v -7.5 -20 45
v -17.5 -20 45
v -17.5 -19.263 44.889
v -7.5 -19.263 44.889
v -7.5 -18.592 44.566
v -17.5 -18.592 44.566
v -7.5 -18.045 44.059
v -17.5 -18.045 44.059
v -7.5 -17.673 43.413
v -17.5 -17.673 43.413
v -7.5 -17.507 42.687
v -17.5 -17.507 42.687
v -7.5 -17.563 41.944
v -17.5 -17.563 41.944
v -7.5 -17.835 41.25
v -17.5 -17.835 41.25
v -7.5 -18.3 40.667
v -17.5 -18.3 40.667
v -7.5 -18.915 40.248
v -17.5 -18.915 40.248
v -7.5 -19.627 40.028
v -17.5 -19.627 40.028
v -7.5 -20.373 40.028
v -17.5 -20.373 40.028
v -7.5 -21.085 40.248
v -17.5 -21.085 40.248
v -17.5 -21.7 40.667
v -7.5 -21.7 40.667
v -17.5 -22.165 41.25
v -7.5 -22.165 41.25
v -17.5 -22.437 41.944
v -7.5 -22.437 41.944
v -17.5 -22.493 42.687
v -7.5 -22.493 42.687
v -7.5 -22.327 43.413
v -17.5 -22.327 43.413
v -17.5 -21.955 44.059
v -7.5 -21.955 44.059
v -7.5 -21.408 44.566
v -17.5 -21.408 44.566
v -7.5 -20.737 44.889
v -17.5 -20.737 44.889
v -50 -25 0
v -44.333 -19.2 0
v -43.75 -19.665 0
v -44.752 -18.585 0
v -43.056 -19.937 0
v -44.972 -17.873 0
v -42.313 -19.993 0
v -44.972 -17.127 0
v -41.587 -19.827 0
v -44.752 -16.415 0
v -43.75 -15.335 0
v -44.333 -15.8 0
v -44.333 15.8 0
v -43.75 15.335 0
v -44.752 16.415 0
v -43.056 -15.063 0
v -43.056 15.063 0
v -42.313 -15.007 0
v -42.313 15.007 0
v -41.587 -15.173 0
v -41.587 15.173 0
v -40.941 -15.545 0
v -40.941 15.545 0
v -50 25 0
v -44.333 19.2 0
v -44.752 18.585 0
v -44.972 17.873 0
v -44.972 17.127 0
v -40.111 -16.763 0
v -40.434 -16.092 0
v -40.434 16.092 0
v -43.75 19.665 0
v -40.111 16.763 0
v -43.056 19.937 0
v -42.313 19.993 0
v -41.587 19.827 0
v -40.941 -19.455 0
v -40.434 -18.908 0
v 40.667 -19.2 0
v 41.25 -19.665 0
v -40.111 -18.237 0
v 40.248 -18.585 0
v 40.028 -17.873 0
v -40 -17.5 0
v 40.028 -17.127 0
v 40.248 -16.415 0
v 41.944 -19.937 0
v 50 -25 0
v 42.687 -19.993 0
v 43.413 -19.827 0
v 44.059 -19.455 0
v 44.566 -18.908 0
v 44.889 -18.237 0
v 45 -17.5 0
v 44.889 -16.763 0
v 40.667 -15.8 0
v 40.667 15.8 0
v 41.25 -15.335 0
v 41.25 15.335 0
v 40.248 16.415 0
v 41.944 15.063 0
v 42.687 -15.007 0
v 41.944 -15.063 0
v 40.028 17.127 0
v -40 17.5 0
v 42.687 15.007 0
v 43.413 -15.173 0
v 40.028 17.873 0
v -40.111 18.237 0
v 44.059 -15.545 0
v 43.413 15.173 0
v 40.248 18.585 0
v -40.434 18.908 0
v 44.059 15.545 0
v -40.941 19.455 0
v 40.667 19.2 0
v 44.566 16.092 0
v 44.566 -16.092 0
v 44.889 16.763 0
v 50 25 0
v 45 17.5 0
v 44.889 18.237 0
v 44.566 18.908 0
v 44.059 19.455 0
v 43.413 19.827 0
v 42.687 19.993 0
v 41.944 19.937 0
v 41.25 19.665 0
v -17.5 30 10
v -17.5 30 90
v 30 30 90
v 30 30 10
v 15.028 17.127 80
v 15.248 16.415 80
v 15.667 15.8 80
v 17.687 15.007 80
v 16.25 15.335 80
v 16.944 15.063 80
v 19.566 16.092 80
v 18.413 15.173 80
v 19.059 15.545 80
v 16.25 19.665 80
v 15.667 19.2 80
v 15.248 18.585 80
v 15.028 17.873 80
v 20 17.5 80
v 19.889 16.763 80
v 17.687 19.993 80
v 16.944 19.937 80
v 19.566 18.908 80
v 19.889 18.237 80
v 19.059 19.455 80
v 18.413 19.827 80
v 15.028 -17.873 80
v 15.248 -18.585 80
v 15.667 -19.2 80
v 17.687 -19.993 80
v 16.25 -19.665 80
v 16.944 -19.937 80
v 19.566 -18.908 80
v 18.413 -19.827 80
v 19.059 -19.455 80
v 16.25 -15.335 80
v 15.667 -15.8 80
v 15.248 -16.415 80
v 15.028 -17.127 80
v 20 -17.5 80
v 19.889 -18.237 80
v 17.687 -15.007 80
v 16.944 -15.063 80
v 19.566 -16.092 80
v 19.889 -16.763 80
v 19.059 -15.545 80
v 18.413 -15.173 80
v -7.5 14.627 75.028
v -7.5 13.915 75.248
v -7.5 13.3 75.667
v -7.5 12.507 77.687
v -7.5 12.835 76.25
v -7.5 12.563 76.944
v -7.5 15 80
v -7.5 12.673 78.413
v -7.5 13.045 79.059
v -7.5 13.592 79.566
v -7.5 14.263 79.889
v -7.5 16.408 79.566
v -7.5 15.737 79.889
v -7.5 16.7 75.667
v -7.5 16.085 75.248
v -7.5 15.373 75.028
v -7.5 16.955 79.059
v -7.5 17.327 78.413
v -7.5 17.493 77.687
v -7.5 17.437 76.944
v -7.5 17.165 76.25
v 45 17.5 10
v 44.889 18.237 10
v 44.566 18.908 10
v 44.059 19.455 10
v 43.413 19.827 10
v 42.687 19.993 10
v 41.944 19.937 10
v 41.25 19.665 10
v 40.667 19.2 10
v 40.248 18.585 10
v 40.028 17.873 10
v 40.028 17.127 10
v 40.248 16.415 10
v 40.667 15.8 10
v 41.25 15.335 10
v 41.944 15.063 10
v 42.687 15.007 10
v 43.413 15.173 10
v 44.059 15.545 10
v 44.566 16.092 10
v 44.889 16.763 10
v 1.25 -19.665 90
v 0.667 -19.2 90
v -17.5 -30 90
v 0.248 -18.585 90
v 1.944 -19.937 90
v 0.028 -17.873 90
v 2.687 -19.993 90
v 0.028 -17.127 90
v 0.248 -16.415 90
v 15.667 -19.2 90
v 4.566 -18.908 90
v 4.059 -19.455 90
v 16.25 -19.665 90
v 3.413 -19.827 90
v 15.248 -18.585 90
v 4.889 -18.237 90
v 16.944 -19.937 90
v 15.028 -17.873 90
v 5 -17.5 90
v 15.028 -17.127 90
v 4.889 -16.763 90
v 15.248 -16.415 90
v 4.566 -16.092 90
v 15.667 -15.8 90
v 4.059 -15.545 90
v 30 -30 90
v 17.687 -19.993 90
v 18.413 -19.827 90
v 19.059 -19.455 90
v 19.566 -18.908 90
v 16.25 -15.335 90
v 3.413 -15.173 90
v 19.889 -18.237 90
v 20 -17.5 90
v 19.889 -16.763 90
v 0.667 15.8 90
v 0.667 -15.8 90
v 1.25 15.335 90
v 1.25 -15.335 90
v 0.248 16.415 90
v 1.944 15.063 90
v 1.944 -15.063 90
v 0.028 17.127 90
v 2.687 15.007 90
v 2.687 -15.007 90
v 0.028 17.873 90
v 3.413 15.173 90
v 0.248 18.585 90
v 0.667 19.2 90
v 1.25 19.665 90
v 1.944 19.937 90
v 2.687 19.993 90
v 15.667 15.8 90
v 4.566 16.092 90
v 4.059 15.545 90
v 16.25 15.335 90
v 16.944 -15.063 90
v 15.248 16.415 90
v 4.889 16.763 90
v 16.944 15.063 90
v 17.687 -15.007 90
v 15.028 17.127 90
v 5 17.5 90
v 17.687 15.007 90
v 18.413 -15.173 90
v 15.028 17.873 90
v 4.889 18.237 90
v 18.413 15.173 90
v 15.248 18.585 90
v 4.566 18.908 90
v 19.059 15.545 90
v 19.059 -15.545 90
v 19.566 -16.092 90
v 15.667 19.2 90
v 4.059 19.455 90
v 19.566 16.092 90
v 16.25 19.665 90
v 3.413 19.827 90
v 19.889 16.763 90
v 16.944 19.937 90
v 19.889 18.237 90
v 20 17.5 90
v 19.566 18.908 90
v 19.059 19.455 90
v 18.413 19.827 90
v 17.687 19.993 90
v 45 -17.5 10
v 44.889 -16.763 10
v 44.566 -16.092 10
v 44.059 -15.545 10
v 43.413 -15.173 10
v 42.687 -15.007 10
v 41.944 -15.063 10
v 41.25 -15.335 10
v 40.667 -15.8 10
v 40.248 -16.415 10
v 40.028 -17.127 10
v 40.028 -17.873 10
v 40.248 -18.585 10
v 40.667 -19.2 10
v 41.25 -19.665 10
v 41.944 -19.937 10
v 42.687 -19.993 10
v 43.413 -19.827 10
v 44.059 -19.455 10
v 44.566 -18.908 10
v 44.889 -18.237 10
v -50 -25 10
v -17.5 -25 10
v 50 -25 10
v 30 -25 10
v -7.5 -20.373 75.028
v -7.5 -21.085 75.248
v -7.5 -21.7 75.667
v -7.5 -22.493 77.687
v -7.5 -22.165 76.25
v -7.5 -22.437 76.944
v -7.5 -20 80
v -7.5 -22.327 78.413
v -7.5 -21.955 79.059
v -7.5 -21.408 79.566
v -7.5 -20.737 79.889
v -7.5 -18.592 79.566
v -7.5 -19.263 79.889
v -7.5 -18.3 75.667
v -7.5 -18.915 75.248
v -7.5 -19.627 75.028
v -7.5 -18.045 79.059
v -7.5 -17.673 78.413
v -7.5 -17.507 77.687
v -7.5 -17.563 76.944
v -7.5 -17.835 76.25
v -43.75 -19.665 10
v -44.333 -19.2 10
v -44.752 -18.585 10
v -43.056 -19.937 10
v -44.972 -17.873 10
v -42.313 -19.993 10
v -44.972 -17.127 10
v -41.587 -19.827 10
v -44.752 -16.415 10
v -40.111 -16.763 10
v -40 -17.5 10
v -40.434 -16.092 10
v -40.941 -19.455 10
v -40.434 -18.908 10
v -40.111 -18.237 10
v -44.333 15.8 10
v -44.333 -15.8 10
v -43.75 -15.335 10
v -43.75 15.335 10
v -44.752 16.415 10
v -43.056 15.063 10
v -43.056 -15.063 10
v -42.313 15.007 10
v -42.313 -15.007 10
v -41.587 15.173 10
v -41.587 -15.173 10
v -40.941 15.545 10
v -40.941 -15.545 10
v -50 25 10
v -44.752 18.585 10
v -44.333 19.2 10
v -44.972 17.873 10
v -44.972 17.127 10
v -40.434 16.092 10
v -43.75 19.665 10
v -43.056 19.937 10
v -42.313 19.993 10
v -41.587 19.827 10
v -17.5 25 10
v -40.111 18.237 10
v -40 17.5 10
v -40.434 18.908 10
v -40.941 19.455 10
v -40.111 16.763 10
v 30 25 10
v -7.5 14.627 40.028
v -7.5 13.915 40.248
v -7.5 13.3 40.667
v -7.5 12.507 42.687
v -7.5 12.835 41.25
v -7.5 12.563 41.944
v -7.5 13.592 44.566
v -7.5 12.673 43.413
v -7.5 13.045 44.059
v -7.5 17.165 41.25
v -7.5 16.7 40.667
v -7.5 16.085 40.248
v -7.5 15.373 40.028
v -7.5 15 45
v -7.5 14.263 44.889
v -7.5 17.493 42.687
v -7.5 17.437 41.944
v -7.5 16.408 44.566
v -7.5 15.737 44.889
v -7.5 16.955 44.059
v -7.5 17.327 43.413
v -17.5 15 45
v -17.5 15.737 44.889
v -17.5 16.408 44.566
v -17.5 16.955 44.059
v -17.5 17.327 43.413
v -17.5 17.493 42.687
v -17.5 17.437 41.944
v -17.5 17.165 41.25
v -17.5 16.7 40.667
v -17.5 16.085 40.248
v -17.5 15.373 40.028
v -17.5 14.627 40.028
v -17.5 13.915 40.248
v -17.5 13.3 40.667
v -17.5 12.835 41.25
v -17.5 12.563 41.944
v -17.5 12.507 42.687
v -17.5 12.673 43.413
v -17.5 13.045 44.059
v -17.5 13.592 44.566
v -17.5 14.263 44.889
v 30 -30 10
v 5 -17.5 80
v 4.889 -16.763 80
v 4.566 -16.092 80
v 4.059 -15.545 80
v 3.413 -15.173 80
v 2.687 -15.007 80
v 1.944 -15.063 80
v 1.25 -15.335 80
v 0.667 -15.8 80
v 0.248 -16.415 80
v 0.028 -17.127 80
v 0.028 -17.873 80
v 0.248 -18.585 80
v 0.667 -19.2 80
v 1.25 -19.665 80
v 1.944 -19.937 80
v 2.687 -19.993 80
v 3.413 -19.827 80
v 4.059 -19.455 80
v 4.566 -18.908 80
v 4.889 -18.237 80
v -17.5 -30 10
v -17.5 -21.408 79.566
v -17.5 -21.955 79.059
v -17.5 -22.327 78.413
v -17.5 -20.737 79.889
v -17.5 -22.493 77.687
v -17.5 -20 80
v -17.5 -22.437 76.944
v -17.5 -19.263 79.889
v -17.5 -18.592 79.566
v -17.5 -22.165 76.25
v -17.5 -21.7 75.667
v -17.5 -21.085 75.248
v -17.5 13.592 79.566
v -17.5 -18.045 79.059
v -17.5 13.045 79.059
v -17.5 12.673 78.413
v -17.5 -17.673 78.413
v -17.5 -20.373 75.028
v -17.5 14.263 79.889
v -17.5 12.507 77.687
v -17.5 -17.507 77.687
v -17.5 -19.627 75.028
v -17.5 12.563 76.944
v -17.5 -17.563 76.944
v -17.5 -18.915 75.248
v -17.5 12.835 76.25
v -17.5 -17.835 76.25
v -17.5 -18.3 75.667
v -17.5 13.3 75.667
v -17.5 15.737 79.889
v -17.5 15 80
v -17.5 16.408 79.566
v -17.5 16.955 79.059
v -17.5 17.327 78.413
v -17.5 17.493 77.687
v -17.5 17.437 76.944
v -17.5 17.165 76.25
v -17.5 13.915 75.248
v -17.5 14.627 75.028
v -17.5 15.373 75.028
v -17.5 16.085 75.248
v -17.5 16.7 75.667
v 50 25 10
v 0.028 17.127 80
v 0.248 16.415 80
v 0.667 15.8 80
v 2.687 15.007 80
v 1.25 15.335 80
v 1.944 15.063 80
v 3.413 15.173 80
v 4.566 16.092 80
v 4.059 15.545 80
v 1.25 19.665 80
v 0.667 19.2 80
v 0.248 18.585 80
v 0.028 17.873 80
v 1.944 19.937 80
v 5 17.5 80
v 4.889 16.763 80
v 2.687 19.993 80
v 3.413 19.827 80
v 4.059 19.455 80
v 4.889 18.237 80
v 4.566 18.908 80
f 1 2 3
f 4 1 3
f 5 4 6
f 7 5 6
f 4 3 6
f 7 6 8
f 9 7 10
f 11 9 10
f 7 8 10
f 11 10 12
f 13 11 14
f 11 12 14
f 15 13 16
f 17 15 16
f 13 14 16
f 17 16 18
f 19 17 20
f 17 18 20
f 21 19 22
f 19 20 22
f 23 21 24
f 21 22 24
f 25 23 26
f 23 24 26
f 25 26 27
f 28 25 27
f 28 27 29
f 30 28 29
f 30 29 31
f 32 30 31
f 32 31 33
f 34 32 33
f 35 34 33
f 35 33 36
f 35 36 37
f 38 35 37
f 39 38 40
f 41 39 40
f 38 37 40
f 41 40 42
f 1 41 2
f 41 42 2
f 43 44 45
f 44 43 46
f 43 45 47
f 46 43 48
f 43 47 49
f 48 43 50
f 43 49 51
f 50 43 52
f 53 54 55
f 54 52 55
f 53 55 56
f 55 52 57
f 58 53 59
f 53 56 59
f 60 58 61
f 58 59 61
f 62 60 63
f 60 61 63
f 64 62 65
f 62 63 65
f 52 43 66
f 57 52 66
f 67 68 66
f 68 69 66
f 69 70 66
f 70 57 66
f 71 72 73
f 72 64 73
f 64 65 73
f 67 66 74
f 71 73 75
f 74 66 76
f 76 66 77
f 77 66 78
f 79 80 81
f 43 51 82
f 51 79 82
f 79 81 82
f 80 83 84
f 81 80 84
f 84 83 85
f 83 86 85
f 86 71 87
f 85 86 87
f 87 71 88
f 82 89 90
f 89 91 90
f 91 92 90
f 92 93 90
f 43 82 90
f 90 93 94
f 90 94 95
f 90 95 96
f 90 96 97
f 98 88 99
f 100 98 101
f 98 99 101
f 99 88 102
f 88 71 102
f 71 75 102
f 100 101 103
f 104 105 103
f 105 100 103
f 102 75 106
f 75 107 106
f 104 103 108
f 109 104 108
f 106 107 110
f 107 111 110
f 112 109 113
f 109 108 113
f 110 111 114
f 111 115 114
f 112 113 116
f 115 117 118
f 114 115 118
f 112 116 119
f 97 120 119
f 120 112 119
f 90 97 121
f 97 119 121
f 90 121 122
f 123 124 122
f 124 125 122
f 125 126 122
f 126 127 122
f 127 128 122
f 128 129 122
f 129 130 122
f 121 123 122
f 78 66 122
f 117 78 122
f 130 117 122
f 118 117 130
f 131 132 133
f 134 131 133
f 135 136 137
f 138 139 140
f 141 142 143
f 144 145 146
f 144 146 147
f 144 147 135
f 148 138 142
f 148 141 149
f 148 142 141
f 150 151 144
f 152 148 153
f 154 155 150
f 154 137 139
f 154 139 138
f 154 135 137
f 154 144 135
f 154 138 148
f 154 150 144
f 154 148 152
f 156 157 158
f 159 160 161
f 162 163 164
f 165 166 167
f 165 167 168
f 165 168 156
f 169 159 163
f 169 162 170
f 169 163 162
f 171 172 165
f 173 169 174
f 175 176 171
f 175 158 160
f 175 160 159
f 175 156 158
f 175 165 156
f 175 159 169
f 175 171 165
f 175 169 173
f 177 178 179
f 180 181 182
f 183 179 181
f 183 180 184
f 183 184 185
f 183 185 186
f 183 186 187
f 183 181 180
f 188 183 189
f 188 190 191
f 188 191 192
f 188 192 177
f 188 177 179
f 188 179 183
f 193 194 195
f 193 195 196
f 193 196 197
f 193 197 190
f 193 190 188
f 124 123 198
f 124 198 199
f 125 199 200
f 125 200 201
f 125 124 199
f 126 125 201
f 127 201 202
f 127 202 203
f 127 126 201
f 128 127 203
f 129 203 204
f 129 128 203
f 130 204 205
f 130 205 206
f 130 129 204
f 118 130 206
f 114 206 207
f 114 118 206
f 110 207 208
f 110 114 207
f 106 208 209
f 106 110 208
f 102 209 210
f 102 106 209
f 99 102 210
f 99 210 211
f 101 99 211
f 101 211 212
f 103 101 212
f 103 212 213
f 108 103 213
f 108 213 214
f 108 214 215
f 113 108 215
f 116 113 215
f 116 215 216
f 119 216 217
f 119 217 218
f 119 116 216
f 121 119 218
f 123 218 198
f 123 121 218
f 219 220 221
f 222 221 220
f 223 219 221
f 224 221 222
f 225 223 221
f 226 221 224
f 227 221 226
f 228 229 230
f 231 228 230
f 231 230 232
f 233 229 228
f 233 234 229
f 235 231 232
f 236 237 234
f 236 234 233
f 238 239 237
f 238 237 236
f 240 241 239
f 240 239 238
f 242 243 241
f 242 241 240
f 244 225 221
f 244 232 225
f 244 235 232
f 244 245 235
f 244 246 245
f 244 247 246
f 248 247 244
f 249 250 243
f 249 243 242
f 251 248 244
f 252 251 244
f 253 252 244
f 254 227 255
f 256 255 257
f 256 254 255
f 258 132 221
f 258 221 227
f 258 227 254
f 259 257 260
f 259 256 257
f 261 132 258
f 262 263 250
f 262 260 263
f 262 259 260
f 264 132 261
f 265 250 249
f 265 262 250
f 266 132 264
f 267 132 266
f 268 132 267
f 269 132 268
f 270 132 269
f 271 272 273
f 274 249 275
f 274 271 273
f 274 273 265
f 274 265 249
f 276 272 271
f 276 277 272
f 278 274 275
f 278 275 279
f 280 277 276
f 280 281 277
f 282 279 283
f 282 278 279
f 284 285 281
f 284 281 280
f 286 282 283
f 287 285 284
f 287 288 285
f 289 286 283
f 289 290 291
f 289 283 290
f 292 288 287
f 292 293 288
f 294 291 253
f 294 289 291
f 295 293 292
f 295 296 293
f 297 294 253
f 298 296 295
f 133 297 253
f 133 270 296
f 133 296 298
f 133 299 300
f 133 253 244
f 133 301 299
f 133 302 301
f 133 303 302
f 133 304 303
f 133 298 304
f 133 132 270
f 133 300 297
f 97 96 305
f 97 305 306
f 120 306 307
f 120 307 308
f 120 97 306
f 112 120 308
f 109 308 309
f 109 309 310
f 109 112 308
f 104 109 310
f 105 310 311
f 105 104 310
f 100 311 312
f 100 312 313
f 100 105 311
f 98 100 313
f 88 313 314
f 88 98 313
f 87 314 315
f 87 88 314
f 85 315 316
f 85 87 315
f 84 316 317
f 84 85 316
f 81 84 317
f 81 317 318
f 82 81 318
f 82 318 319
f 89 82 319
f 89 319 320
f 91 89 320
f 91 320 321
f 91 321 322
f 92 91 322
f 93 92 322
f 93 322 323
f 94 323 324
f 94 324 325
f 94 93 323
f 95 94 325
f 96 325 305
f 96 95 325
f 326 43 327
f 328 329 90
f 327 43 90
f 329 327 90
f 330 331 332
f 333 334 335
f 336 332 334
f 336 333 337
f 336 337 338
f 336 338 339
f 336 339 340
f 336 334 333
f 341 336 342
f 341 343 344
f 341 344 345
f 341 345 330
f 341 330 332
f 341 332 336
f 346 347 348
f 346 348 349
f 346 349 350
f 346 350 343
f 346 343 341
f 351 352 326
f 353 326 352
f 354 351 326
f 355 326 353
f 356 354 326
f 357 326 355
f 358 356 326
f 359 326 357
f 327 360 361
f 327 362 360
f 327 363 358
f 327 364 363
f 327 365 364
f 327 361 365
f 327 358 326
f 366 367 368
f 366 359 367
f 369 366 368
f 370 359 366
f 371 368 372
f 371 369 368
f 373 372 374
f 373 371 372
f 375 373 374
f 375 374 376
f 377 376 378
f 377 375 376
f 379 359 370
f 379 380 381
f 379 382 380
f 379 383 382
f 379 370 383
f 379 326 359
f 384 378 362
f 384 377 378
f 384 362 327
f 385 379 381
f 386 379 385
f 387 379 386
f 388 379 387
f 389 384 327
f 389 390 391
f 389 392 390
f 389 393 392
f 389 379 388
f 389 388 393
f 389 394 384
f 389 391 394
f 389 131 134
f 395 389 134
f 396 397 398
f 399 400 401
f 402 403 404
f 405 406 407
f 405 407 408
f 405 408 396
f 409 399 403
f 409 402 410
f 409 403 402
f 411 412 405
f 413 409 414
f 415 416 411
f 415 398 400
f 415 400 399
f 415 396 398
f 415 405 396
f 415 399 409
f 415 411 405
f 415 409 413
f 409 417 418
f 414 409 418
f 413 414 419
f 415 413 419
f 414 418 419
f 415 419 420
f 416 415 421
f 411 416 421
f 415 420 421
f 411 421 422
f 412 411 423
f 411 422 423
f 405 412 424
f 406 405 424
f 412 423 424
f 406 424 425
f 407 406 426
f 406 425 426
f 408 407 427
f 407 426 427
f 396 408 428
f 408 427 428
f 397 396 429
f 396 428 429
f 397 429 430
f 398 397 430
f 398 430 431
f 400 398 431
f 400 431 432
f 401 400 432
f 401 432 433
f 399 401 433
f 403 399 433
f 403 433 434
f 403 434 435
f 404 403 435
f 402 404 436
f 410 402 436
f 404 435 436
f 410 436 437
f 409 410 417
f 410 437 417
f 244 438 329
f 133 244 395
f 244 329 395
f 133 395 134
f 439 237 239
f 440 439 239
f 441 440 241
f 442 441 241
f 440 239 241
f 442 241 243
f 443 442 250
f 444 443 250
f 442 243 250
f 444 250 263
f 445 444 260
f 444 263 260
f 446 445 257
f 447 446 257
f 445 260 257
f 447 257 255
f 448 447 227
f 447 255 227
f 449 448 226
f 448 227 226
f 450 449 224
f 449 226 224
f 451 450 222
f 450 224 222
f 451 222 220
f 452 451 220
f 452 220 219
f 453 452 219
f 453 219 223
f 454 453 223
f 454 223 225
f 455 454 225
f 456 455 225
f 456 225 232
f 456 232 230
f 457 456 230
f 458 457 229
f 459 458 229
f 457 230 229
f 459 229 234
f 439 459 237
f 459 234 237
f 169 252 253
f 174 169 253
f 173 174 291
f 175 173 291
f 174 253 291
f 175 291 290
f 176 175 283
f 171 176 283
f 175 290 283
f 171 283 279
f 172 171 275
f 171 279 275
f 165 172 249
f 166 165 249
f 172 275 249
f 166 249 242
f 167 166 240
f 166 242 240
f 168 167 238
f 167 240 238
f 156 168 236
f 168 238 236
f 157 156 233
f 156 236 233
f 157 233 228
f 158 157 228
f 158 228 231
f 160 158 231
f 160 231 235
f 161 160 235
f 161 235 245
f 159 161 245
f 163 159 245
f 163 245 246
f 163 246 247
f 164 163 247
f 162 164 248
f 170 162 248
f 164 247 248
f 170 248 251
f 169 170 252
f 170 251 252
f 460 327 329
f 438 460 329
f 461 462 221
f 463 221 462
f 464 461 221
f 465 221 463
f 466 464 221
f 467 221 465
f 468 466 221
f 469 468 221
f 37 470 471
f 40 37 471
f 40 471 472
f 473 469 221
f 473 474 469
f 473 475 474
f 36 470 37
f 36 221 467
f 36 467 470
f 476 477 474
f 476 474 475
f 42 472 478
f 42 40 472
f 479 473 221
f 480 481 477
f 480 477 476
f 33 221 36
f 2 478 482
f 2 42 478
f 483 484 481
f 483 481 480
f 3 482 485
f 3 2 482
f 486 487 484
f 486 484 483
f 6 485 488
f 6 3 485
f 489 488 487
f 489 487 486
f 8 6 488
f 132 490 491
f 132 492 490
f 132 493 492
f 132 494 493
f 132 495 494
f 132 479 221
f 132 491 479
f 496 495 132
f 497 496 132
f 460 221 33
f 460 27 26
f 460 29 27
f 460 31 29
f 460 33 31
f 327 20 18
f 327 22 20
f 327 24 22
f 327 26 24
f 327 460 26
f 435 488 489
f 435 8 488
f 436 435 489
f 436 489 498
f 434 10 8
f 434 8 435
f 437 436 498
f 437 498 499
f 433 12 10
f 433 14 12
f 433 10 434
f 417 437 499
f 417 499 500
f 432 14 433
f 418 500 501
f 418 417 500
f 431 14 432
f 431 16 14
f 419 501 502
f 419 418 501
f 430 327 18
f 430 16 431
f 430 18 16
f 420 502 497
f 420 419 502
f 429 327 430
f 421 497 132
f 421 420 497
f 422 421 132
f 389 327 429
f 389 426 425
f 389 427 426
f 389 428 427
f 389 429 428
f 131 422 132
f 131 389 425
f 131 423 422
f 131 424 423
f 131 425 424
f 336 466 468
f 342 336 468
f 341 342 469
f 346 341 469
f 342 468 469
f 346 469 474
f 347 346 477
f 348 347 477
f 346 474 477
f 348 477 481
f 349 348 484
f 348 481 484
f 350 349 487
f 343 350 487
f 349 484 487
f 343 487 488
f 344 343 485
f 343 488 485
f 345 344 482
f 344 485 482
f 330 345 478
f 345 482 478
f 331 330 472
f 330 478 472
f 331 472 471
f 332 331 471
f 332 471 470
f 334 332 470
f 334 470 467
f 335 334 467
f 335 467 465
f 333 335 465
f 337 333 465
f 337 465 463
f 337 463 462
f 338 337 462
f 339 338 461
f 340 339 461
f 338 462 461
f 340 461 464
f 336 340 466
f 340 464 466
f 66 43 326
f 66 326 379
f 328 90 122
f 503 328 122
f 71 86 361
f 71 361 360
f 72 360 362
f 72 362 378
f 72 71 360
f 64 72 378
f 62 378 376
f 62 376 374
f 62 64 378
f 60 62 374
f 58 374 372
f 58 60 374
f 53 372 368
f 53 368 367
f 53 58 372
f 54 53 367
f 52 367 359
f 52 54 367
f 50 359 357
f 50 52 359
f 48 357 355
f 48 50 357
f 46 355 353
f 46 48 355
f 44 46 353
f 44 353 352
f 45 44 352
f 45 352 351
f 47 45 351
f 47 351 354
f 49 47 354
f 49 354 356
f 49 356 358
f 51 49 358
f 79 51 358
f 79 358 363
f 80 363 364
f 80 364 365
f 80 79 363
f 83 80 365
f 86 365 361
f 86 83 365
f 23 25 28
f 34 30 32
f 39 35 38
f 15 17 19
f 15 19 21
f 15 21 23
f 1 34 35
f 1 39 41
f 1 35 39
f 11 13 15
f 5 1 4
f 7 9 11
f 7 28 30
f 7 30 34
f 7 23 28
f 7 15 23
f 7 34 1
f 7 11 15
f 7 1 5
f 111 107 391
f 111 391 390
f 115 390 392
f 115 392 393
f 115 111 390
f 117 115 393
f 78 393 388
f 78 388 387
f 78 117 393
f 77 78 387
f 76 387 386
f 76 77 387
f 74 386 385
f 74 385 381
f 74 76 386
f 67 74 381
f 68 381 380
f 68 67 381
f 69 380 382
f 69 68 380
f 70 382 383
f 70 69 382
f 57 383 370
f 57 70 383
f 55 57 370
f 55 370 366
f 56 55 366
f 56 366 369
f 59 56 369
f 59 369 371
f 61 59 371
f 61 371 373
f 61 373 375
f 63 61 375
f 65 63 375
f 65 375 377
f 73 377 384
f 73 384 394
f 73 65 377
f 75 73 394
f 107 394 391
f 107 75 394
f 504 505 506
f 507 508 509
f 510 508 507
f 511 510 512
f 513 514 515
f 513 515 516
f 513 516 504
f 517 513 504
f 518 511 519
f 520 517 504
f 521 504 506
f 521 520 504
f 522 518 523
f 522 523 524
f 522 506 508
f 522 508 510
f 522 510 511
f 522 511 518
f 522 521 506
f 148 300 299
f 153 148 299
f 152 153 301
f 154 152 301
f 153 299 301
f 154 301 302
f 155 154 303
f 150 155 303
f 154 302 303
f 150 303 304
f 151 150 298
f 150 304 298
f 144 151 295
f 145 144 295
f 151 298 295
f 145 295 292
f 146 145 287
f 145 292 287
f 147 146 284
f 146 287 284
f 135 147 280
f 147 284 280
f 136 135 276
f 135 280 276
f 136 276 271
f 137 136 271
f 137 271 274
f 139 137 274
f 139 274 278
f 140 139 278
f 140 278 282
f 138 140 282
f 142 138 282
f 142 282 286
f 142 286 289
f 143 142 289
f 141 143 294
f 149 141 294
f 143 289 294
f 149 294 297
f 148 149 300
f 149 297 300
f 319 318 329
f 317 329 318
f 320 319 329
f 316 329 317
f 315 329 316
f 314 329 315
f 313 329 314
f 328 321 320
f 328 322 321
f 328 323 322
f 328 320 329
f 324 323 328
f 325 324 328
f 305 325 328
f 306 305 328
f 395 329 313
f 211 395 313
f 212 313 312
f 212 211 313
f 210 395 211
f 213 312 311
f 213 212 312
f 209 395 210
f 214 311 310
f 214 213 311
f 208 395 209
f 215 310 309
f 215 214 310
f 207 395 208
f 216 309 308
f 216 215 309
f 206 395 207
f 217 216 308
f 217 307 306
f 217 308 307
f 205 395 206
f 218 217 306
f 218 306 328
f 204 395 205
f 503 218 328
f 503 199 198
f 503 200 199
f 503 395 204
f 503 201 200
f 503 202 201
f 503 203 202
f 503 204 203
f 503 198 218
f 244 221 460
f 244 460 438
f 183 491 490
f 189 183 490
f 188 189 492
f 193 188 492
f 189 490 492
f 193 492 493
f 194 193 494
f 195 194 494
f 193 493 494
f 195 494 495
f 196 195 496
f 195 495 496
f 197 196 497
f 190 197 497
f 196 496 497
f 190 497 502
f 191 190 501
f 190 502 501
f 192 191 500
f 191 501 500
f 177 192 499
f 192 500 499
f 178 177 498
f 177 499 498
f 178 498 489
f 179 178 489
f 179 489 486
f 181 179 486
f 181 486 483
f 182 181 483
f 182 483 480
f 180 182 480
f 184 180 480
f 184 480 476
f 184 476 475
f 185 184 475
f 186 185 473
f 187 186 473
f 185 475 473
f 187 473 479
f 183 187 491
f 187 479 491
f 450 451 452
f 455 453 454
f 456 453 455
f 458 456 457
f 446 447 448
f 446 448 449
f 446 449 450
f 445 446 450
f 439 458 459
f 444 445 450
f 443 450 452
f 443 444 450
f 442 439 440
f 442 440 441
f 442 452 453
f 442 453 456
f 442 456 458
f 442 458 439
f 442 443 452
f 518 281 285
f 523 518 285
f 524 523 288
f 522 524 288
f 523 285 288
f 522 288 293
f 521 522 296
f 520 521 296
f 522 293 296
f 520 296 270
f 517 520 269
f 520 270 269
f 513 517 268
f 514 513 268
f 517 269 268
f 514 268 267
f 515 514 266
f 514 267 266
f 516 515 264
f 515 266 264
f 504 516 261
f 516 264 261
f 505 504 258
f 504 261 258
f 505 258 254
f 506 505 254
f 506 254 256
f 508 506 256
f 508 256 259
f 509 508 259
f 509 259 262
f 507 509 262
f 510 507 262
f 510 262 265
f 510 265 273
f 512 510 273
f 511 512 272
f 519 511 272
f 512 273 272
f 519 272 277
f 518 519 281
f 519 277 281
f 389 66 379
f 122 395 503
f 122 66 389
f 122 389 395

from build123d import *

# Parameters (mm, degrees)
SKETCH1_W           = 100
SKETCH1_H           = 50
SKETCH1_R           = 2.5
BOSS_EXTRUDE1_DEPTH = 10
SKETCH2_W           = 47.5
SKETCH2_H           = 60
BOSS_EXTRUDE2_DEPTH = 80
SKETCH3_R           = 2.5
CUT_EXTRUDE1_DEPTH  = 10
SKETCH9_R           = 2.5
CUT_EXTRUDE18_DEPTH = 10


with BuildPart() as part:
    # Sketch1 → Boss-Extrude1 (new body)
    with BuildSketch(Plane.XY):
        Rectangle(SKETCH1_W, SKETCH1_H)
        with Locations((-42.5, 17.5)):
            Circle(SKETCH1_R, mode=Mode.SUBTRACT)
        with Locations((42.5, 17.5)):
            Circle(SKETCH1_R, mode=Mode.SUBTRACT)
        with Locations((42.5, -17.5)):
            Circle(SKETCH1_R, mode=Mode.SUBTRACT)
        with Locations((-42.5, -17.5)):
            Circle(SKETCH1_R, mode=Mode.SUBTRACT)
    extrude(amount=BOSS_EXTRUDE1_DEPTH)

    # Sketch2 → Boss-Extrude2 (add)
    with BuildSketch(Plane.XY.offset(10)):
        with Locations((6.25, 0)):
            Rectangle(SKETCH2_W, SKETCH2_H)
    extrude(amount=BOSS_EXTRUDE2_DEPTH)

    # Sketch3 → Cut-Extrude1 (cut)
    with BuildSketch(Plane.XY.offset(90)):
        with Locations((17.5, 17.5)):
            Circle(SKETCH3_R)
        with Locations((2.5, 17.5)):
            Circle(SKETCH3_R)
        with Locations((2.5, -17.5)):
            Circle(SKETCH3_R)
        with Locations((17.5, -17.5)):
            Circle(SKETCH3_R)
    extrude(amount=-CUT_EXTRUDE1_DEPTH, mode=Mode.SUBTRACT)

    # Sketch9 → Cut-Extrude18 (cut)
    with BuildSketch(Plane.ZY.offset(17.5)):
        with Locations((77.5, 15)):
            Circle(SKETCH9_R)
        with Locations((42.5, -20)):
            Circle(SKETCH9_R)
        with Locations((77.5, -20)):
            Circle(SKETCH9_R)
        with Locations((42.5, 15)):
            Circle(SKETCH9_R)
    extrude(amount=-CUT_EXTRUDE18_DEPTH, mode=Mode.SUBTRACT)


solid = part.part
